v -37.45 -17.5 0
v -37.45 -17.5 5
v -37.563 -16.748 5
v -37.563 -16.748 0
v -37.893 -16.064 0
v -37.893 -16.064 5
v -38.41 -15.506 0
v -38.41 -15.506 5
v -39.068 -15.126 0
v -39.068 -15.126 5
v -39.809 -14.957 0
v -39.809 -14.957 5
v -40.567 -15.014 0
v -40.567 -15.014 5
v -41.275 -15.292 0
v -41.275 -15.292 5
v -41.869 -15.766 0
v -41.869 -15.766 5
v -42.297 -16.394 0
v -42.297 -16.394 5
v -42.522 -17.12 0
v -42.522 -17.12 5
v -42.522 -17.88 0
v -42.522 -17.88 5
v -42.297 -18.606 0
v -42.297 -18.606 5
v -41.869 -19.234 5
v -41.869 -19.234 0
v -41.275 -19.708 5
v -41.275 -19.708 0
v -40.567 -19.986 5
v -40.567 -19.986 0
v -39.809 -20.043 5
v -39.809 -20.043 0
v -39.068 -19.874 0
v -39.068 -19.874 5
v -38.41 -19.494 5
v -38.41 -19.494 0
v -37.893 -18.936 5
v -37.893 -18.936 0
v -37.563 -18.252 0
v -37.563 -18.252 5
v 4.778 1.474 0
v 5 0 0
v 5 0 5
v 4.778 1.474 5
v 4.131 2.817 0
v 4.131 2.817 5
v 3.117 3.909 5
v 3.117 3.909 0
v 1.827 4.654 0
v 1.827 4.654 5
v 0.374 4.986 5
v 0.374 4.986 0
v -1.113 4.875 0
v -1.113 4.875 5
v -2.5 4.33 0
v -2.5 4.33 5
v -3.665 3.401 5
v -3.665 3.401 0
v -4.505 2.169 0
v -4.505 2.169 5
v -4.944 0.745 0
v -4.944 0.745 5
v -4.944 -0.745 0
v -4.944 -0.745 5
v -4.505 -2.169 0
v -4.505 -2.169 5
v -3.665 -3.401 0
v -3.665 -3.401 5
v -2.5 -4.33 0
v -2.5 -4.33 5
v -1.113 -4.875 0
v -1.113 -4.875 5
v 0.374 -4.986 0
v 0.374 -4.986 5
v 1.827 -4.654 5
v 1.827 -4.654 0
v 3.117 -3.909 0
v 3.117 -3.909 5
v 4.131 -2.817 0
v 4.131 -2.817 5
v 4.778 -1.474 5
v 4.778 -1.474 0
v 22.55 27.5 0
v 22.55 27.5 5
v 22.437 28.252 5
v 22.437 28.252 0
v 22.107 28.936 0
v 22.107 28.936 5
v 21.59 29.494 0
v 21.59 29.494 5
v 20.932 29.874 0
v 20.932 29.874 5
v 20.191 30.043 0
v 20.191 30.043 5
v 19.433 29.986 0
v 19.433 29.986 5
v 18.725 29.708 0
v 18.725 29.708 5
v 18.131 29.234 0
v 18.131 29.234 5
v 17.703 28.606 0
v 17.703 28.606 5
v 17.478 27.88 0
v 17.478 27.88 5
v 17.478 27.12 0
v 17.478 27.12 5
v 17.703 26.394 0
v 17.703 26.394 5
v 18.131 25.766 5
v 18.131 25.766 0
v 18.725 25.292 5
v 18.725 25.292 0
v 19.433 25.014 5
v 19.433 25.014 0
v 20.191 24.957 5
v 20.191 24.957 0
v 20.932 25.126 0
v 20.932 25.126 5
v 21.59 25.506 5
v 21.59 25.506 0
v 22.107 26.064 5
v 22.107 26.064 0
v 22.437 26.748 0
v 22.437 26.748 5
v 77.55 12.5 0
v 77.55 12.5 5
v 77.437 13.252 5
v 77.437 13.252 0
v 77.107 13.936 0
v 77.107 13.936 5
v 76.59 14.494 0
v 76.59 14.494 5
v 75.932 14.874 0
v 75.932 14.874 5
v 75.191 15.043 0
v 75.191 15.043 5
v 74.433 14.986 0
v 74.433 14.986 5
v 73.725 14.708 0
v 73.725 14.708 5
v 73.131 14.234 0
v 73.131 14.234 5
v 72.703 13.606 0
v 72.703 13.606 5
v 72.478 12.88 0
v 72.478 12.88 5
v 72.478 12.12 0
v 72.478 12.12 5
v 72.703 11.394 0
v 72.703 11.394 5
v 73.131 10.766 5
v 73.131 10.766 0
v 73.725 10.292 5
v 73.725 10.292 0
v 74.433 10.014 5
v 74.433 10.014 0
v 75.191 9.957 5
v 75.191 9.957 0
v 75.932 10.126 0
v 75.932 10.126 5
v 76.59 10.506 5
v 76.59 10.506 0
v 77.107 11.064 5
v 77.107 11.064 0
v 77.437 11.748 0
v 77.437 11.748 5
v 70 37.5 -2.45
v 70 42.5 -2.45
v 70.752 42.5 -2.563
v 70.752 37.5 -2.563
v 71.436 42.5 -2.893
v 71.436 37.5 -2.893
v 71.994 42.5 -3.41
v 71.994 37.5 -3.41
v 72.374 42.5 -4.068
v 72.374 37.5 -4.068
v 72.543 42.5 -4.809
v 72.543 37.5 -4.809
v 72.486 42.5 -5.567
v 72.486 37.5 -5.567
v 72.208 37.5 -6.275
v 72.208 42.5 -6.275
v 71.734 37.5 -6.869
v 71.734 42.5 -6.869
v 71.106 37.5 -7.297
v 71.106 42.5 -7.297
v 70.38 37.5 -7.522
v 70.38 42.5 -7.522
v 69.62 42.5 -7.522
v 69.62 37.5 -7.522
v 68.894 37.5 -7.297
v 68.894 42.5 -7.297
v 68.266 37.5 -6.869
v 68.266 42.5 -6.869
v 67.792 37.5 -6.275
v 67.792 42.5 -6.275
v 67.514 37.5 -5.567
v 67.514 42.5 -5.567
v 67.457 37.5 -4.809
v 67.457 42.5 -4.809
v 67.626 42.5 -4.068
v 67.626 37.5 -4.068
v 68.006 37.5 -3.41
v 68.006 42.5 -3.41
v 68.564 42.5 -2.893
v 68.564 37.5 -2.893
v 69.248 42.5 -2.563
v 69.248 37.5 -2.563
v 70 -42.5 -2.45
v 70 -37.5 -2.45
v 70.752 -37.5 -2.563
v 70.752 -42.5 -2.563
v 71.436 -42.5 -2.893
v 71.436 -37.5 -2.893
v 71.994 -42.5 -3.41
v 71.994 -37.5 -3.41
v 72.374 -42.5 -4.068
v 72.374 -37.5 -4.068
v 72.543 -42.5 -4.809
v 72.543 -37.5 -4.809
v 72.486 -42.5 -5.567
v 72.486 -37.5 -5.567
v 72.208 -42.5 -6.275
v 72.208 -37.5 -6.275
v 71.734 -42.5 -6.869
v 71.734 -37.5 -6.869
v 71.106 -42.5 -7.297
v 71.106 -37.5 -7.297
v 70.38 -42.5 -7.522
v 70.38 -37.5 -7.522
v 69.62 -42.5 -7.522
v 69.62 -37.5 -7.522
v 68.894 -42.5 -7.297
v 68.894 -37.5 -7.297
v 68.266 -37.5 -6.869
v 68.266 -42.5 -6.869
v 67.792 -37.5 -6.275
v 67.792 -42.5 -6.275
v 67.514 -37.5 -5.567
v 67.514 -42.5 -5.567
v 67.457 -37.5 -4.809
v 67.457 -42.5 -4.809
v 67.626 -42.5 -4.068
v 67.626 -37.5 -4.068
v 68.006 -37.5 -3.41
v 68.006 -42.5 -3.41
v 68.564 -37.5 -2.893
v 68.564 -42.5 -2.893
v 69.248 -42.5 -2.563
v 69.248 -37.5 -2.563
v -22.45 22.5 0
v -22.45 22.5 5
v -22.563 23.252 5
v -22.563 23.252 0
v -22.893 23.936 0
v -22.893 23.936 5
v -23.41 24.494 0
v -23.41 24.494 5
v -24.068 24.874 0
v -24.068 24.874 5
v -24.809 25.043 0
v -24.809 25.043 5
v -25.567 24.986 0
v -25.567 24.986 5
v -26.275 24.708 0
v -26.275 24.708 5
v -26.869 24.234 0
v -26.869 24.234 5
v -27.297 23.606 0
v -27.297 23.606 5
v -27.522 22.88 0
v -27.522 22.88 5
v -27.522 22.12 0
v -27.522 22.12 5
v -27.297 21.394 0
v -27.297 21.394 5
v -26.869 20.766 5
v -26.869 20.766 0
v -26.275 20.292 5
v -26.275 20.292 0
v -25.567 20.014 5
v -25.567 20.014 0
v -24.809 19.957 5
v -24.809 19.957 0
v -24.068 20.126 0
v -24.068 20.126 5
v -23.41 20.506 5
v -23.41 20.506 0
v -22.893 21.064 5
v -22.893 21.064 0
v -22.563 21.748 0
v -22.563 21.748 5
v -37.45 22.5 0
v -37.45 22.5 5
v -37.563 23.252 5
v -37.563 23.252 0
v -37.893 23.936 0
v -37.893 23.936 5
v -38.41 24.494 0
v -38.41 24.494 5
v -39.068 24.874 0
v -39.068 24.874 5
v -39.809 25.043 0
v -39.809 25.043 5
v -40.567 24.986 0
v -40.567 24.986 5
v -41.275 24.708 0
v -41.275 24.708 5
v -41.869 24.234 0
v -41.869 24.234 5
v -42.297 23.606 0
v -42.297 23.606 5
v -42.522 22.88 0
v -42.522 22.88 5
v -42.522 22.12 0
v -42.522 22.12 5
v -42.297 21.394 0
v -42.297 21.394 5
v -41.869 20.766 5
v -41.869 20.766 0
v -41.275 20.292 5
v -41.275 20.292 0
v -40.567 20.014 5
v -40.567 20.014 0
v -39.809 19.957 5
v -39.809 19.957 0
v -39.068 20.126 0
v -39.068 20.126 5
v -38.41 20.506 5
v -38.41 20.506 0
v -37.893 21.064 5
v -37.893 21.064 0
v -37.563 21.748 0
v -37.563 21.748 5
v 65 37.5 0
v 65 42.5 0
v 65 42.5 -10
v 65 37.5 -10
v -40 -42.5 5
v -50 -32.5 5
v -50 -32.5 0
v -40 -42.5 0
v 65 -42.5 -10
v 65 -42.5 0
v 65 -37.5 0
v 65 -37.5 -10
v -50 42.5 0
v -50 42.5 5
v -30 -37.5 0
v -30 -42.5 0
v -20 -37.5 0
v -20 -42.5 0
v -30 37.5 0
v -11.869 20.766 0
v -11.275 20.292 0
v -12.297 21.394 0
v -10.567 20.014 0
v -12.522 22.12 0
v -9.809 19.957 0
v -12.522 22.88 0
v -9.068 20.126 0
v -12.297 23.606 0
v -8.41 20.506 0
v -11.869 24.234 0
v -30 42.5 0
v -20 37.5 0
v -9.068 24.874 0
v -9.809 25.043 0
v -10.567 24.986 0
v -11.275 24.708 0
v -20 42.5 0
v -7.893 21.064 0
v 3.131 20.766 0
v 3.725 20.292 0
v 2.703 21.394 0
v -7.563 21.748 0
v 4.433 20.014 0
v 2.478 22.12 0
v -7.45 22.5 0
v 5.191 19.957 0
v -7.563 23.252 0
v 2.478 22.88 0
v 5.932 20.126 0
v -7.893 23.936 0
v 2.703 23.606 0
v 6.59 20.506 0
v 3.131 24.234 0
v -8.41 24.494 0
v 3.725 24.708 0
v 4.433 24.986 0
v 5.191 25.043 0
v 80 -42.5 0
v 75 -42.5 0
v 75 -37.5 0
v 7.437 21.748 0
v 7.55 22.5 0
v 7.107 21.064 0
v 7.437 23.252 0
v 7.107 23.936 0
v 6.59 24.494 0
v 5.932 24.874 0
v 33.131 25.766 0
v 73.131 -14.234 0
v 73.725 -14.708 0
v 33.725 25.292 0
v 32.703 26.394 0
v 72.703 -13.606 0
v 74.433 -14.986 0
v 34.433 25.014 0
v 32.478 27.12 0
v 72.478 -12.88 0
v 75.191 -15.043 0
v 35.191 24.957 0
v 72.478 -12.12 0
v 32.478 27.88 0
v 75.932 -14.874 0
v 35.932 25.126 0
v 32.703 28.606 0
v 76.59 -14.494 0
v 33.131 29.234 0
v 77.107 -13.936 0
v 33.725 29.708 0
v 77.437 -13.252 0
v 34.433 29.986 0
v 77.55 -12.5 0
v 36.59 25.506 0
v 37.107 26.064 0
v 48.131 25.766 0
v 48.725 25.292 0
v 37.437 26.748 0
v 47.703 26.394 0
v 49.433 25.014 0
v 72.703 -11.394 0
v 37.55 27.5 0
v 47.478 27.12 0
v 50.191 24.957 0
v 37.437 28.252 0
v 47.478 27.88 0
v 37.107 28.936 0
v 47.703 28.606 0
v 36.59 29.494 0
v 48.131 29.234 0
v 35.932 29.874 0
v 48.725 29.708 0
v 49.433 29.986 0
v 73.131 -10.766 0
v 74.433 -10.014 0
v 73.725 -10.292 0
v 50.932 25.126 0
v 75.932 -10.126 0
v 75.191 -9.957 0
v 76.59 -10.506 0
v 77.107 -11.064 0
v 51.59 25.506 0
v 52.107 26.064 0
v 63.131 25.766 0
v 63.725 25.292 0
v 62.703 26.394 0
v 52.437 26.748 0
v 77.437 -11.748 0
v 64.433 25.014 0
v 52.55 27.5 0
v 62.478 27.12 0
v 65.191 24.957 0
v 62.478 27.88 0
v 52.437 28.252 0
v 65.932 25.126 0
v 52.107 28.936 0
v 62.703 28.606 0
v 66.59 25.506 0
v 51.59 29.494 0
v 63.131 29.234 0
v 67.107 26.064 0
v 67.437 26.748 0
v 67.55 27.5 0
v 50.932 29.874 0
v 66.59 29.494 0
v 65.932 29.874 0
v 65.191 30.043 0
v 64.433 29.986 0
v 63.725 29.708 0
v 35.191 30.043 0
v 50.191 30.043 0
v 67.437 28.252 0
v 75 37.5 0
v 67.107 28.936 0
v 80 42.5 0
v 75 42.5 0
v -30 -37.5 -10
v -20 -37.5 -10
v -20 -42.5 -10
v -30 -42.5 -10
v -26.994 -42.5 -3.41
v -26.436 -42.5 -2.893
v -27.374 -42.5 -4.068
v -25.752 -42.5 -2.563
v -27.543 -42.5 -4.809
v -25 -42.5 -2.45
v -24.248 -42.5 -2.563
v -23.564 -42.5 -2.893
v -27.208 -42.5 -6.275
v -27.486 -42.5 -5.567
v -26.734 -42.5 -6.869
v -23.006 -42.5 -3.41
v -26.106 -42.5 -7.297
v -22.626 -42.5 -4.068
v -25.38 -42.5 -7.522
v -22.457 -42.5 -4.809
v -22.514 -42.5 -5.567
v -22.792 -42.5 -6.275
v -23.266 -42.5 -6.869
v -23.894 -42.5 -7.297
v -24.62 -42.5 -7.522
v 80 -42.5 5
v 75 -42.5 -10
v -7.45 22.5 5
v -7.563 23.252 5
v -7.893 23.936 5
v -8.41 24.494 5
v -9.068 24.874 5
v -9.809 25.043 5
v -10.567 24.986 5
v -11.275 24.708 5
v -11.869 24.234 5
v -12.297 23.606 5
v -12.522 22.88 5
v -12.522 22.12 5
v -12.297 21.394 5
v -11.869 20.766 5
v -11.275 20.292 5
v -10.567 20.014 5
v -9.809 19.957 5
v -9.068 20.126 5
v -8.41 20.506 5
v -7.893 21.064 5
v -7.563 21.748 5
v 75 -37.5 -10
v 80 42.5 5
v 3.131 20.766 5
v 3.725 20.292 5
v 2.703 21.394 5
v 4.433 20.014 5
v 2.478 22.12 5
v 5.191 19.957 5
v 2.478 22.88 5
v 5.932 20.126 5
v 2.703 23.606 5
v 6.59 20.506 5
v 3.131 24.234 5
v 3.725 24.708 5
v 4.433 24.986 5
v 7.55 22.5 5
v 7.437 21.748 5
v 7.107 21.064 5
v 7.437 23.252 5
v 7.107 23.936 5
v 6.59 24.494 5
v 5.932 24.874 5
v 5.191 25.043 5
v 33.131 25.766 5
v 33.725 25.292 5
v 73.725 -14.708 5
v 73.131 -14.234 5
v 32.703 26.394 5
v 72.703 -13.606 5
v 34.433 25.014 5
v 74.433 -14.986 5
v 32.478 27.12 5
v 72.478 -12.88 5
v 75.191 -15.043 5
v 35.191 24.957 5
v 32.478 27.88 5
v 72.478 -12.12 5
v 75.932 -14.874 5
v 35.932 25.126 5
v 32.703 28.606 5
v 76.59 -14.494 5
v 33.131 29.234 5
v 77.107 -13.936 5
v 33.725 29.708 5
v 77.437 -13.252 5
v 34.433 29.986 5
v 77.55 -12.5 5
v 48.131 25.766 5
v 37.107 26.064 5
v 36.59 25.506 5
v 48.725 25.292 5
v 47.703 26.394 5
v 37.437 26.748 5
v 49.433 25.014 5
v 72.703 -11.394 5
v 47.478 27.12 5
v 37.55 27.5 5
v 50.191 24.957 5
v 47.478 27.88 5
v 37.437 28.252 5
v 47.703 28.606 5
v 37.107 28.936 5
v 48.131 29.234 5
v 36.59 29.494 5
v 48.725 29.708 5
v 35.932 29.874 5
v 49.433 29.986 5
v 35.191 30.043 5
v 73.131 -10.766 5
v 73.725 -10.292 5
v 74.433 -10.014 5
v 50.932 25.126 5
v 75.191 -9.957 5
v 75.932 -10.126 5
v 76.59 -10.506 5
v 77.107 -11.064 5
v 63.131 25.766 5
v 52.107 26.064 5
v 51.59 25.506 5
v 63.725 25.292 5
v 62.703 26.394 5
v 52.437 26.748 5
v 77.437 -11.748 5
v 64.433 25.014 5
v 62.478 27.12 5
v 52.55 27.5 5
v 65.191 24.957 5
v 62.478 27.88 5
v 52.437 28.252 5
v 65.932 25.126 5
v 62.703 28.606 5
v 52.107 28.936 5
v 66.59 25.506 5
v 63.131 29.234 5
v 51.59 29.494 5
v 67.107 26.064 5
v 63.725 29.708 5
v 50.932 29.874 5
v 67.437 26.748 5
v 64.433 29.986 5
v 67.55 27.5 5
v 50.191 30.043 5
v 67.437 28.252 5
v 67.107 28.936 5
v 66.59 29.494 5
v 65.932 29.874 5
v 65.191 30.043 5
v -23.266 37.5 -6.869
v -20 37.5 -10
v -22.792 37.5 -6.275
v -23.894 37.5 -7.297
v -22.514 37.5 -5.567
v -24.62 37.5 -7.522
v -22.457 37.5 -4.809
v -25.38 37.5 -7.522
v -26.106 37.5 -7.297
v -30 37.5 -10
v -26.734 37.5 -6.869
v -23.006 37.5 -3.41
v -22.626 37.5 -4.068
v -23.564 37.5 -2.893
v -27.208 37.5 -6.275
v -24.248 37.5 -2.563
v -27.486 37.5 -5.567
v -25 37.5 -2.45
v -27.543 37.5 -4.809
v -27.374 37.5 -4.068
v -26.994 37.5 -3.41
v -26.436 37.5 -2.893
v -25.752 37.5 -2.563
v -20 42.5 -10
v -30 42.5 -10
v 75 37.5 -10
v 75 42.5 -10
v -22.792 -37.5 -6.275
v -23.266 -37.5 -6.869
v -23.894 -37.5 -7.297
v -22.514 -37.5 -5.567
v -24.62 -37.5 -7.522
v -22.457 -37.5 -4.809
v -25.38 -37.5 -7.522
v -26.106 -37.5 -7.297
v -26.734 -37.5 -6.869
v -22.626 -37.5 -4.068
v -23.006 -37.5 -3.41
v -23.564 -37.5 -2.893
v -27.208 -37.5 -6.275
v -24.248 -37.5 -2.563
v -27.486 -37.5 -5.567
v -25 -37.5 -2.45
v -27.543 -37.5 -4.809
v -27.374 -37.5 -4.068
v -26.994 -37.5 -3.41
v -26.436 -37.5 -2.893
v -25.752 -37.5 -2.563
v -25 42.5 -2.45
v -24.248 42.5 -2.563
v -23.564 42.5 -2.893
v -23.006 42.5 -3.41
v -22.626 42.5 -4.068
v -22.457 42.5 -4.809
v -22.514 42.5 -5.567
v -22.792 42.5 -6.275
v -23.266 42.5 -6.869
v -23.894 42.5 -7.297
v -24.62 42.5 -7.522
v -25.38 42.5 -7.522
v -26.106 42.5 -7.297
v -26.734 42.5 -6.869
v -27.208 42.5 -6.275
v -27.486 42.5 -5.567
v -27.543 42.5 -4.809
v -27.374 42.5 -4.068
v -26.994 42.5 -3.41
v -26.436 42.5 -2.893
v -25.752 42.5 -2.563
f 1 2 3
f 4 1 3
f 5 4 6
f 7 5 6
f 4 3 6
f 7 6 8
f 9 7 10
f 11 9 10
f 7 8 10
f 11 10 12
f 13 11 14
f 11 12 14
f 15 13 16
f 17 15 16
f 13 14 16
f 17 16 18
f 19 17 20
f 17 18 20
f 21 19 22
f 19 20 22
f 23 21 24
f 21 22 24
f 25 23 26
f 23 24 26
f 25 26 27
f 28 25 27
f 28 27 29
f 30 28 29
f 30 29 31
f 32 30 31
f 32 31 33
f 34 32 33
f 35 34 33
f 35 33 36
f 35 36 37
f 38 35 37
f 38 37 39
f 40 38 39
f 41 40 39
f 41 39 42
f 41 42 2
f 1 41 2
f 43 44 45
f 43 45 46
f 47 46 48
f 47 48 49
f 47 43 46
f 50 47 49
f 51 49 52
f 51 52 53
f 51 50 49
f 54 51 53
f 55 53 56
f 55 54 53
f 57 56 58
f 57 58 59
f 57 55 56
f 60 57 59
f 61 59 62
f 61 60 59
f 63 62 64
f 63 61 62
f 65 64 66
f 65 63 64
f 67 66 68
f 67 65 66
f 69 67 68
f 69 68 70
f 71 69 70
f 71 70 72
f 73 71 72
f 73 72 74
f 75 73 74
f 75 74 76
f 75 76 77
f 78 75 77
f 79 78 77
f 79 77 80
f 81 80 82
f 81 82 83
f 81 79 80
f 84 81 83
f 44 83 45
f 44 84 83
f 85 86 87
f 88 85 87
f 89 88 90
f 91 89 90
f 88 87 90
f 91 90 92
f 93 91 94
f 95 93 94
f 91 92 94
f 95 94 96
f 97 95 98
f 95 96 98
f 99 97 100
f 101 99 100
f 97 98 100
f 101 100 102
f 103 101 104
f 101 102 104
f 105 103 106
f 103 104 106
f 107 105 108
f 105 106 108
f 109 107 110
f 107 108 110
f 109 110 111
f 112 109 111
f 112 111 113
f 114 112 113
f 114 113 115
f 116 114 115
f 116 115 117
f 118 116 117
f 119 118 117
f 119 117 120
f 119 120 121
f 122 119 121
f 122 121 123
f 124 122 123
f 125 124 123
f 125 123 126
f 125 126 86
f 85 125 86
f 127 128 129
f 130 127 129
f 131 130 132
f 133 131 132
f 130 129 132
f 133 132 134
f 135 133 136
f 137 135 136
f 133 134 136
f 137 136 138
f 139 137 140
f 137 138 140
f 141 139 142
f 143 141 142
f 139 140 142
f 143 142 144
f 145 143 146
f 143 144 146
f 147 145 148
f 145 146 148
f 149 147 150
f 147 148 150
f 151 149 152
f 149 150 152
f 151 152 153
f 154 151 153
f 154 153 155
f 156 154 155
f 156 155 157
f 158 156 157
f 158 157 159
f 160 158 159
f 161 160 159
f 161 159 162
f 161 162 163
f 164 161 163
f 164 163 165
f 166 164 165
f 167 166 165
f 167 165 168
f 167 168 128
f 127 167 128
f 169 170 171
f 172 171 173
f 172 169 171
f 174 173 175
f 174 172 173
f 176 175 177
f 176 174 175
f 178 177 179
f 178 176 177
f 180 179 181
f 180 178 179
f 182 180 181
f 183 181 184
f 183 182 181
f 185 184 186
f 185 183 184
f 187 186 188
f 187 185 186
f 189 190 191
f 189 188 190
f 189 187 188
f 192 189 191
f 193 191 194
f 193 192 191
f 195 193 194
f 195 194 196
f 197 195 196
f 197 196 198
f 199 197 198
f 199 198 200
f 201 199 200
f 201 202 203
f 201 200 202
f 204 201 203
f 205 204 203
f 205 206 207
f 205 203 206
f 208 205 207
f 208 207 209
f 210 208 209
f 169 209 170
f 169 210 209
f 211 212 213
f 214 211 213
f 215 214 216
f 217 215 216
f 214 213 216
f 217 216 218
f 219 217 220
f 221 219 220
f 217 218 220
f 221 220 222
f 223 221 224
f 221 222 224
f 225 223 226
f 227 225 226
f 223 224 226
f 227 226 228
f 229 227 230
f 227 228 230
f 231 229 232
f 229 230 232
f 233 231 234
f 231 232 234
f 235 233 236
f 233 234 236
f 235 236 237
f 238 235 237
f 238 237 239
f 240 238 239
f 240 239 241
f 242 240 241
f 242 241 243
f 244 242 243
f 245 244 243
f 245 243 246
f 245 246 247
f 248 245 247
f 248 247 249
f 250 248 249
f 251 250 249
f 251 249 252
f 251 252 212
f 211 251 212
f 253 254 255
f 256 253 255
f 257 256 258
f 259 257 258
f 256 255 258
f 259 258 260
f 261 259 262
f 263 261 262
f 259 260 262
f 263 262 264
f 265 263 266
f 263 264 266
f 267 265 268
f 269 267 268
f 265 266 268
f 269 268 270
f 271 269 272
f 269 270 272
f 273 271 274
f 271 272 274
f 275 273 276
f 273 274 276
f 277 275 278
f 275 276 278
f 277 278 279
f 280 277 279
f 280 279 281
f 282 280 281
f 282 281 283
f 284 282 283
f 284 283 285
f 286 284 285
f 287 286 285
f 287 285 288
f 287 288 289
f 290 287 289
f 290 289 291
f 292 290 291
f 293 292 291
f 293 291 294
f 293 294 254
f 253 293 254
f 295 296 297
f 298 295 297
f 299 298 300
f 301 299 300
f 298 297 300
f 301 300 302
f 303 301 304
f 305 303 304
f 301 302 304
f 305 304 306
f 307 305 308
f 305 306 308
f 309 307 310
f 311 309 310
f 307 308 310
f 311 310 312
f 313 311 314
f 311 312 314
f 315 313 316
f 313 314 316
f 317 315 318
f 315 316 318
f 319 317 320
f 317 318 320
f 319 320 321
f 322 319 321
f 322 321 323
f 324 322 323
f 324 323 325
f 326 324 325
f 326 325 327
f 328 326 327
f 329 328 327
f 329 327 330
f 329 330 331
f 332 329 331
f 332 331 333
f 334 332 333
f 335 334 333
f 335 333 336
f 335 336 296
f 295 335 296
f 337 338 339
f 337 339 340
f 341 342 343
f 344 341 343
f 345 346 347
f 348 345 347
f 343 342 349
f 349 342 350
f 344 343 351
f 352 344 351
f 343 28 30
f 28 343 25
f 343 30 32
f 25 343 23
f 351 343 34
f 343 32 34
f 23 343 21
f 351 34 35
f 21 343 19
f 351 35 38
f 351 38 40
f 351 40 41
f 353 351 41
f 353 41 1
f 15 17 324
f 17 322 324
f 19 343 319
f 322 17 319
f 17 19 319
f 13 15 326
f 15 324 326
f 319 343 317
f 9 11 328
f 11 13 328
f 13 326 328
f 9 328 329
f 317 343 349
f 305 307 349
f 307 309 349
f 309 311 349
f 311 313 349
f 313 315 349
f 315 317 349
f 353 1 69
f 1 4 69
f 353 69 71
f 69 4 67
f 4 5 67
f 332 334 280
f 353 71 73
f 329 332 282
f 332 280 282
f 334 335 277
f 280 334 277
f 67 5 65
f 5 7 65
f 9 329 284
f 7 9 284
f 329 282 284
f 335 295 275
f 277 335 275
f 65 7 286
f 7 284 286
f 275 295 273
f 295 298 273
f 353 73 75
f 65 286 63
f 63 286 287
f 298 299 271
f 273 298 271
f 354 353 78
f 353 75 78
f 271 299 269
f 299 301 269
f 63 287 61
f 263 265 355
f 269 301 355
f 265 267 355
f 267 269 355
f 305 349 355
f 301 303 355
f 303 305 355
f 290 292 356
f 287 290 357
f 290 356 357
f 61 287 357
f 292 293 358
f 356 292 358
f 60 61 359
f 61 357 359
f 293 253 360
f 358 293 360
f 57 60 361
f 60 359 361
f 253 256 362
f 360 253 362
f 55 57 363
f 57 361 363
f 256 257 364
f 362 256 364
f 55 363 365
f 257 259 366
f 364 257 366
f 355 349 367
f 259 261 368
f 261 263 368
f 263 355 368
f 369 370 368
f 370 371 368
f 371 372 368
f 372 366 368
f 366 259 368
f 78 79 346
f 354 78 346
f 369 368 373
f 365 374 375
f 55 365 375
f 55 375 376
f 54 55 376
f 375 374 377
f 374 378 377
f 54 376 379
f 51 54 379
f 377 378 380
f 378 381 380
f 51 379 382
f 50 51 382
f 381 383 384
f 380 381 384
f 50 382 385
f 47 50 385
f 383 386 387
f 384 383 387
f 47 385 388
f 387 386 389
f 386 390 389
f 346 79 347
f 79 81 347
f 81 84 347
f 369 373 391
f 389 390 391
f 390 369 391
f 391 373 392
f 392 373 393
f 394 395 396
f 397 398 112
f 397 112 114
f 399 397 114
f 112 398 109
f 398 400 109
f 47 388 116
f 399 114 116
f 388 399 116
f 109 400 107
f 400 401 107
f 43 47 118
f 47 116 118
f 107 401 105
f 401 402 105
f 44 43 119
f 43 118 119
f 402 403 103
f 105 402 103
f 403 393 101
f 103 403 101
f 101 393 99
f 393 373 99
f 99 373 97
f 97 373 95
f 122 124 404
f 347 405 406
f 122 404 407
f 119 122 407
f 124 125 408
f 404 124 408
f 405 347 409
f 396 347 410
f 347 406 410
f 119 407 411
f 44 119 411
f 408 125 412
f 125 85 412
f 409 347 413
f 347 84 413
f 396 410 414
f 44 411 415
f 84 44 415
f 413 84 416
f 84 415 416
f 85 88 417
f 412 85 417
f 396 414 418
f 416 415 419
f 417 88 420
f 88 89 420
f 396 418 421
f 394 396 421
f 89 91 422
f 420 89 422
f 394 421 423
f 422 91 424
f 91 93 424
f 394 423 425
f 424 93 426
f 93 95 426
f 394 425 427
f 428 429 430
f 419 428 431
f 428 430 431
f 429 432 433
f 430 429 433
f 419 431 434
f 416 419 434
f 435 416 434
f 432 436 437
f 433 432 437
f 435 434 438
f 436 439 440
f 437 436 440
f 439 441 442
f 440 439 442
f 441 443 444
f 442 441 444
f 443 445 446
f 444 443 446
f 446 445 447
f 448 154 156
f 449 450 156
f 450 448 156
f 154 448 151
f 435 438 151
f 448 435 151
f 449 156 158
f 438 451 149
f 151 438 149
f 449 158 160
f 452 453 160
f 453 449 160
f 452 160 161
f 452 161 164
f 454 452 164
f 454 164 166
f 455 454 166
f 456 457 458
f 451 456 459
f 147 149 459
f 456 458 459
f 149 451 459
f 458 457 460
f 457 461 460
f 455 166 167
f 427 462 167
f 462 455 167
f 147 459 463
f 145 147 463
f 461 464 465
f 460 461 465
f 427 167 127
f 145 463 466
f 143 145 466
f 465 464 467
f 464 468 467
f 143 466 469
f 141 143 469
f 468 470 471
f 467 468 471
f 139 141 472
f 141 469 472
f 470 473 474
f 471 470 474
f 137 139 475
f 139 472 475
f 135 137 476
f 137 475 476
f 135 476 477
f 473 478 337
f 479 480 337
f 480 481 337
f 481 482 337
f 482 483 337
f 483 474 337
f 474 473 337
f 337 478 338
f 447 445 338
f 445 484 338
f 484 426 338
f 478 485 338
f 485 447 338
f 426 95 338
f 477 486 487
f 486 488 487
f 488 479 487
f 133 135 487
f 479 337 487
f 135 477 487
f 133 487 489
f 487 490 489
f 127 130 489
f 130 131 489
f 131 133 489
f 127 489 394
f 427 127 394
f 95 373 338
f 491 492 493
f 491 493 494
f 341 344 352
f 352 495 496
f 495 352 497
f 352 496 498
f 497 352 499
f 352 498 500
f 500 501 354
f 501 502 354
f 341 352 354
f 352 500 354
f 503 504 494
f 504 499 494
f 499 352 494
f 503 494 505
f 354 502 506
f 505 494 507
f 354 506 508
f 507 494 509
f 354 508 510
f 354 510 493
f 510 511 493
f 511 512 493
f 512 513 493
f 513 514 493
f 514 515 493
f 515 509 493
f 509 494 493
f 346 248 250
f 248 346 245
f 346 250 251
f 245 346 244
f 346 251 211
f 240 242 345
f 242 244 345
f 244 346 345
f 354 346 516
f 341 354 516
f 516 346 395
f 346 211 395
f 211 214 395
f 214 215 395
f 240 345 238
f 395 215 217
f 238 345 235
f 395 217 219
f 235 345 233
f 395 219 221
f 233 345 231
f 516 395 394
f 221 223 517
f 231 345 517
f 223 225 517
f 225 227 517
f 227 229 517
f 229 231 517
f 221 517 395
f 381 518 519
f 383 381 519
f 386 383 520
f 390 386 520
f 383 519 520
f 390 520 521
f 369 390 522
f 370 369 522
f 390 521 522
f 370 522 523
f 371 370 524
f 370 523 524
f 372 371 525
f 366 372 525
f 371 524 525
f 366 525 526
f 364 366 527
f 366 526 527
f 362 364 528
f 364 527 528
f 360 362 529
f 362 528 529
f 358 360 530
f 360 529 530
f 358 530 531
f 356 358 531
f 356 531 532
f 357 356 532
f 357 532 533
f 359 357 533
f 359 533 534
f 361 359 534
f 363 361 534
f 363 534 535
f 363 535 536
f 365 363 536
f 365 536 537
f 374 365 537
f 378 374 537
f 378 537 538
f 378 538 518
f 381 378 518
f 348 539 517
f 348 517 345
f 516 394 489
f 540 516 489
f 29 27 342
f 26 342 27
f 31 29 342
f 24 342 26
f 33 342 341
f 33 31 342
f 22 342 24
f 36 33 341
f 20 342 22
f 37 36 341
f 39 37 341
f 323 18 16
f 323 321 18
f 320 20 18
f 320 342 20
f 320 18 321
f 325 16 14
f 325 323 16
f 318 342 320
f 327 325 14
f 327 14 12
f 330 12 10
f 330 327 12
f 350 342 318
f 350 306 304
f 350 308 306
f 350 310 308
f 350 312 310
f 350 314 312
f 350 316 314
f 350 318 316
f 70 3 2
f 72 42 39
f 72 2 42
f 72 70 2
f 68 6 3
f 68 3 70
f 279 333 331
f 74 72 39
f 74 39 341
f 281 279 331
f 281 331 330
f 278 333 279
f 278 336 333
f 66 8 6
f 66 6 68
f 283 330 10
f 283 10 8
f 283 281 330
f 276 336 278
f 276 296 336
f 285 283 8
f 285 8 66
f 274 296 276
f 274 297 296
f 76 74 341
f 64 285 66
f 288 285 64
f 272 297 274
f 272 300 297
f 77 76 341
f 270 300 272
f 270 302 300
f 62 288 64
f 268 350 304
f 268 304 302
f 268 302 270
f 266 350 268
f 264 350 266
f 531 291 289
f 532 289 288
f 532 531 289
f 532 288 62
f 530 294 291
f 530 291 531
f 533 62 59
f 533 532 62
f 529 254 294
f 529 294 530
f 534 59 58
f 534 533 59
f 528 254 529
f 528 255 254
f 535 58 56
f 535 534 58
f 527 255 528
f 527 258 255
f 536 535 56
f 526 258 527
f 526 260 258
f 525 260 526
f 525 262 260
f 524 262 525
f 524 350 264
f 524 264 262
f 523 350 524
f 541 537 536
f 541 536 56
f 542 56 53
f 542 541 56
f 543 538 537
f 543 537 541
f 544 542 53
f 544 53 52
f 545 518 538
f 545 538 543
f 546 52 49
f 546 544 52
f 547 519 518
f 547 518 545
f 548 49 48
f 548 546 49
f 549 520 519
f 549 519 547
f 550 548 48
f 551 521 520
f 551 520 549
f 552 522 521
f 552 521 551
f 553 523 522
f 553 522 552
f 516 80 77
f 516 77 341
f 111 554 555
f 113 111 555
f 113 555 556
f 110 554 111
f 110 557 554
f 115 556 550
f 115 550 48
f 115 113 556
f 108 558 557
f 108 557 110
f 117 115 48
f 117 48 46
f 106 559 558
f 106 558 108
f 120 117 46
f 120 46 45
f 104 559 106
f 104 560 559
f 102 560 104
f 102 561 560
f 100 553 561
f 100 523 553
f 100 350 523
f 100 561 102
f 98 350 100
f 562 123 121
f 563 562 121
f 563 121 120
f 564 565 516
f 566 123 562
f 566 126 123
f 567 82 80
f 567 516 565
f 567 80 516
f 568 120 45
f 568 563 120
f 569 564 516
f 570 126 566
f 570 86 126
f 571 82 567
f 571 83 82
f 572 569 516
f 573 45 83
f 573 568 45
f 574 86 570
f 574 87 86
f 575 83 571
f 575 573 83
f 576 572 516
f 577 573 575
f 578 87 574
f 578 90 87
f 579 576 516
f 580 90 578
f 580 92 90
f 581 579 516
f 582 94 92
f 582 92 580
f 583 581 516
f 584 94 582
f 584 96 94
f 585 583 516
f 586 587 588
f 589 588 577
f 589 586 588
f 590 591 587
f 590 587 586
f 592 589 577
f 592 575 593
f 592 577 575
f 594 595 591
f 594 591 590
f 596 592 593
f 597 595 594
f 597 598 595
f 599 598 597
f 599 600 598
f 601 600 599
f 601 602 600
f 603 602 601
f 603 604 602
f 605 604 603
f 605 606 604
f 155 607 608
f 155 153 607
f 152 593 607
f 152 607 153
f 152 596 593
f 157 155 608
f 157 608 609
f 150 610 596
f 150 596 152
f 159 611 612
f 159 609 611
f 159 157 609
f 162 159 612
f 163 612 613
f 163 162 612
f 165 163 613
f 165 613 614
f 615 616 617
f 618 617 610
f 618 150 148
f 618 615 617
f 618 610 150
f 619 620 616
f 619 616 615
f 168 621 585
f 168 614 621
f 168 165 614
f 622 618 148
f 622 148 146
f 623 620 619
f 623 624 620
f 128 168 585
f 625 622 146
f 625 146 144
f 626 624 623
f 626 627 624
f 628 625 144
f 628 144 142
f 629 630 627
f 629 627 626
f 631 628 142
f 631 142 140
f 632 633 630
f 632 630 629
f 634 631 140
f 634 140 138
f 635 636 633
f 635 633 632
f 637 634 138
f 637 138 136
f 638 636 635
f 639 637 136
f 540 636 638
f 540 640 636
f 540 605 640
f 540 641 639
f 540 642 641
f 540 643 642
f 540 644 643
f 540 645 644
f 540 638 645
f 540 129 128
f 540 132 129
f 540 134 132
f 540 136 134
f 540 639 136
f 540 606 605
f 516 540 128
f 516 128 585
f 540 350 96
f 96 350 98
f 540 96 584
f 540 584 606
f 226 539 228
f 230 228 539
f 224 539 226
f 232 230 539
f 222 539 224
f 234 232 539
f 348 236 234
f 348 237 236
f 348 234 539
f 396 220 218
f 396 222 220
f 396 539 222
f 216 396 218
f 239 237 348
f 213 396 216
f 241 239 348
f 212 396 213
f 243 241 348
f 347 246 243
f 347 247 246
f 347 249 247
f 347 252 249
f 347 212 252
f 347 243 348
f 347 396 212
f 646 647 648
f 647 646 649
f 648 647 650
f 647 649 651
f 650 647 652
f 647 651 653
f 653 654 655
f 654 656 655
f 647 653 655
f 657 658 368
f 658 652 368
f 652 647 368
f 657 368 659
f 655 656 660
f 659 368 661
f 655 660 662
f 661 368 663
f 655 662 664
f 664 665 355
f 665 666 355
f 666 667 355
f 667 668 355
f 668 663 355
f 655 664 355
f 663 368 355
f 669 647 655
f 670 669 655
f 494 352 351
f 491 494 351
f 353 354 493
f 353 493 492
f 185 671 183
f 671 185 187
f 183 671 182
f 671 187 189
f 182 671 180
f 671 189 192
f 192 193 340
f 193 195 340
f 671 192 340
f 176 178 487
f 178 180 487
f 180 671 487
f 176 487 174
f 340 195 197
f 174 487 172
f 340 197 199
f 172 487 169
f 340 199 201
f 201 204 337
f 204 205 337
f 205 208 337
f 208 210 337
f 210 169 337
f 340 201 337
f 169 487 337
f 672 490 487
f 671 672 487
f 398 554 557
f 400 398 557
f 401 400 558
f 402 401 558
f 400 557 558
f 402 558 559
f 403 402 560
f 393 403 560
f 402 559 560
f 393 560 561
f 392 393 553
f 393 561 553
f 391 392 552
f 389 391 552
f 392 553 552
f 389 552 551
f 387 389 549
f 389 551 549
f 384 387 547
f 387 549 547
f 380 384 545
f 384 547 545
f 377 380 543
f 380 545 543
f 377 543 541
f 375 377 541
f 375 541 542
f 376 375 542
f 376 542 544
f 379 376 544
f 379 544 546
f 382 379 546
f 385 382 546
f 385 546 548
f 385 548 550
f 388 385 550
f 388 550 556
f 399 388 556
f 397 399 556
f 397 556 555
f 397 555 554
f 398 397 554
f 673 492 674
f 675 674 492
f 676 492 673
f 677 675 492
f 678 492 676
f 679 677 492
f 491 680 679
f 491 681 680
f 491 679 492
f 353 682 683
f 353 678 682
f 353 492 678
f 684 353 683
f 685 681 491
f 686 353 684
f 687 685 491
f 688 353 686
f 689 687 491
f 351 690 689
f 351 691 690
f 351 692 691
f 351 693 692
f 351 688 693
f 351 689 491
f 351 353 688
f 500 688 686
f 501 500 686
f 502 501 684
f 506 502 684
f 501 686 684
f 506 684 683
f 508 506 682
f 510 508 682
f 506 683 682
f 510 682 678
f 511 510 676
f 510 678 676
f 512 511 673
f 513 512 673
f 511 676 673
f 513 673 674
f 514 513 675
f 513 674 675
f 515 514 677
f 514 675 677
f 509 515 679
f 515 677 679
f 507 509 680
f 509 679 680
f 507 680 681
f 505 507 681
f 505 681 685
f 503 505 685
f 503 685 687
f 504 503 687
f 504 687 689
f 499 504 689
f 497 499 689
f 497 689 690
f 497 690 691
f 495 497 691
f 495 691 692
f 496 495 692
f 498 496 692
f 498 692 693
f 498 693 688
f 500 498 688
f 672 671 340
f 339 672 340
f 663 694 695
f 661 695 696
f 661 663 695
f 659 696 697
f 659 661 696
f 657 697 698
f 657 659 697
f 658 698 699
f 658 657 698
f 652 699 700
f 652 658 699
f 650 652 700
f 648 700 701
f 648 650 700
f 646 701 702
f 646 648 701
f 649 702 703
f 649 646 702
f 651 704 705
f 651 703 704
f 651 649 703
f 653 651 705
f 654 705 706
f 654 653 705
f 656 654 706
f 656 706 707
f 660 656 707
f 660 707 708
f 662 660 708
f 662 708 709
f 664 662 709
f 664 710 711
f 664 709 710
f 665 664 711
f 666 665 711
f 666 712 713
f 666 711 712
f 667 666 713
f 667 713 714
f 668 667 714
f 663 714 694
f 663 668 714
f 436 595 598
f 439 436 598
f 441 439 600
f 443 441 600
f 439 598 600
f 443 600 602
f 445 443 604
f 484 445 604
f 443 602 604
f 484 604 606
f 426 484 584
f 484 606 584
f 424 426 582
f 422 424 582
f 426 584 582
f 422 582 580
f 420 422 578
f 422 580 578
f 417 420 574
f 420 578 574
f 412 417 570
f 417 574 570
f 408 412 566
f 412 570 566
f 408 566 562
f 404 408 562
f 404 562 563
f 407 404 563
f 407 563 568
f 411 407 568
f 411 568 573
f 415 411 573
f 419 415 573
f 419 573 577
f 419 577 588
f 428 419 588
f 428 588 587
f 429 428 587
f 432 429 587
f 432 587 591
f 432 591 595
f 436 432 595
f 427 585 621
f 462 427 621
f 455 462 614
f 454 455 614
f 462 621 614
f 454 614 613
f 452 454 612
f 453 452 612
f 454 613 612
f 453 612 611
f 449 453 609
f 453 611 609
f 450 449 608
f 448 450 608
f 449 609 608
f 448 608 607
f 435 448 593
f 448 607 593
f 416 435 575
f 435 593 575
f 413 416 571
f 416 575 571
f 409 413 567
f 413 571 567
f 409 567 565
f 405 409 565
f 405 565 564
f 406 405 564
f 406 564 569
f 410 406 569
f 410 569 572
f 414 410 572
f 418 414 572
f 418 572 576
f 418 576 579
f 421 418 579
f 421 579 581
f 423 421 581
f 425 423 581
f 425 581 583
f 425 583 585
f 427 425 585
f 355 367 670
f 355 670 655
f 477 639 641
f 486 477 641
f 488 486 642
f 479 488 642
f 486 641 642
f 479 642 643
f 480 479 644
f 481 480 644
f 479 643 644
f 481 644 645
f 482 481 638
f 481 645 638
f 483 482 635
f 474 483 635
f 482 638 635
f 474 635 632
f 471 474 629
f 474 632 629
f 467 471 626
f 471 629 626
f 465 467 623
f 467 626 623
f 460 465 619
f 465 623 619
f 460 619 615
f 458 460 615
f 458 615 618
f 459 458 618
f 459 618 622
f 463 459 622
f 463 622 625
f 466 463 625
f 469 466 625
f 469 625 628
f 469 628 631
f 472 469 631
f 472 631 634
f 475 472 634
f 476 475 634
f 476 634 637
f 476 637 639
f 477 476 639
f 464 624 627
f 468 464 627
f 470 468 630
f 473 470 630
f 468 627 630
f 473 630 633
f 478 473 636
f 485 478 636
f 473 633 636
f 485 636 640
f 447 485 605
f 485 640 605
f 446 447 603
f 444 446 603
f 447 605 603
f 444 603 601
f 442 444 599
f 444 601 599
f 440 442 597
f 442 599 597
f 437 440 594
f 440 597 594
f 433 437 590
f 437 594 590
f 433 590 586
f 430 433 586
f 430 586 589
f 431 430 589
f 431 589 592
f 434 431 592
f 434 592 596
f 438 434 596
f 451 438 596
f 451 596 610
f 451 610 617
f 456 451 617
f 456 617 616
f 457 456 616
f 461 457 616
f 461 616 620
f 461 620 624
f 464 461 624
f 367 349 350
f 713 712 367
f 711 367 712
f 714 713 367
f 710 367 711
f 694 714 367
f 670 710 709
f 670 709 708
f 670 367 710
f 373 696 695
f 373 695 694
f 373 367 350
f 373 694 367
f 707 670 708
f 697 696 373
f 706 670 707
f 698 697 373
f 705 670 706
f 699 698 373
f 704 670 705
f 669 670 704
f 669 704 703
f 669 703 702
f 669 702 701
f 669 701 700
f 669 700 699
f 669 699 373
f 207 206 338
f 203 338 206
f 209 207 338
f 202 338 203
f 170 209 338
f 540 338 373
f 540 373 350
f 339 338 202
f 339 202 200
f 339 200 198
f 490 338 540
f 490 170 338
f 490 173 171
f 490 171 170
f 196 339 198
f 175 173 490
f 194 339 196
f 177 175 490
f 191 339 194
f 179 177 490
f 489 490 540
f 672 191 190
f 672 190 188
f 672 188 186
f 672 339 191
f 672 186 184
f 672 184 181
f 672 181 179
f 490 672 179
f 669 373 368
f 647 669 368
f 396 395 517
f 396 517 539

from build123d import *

# Parameters (mm, degrees)
SKETCH1_W           = 160
SKETCH1_H           = 85
SKETCH1_R           = 5
BOSS_EXTRUDE1_DEPTH = 5
SKETCH3_W           = 30
SKETCH3_H           = 85
CUT_EXTRUDE2_DEPTH  = 15
SKETCH5_R           = 2.55
CUT_EXTRUDE3_DEPTH  = 15
CHAMFER1_SIZE       = 10
SKETCH6_W           = 10
SKETCH6_H           = 5
BOSS_EXTRUDE2_DEPTH = 10
SKETCH7_R           = 2.55
CUT_EXTRUDE4_DEPTH  = 114.578166916
SKETCH8_R           = 2.55
CUT_EXTRUDE5_DEPTH  = 92.821838361


with BuildPart() as part:
    # Sketch1 → Boss-Extrude1 (new body)
    with BuildSketch(Plane.XY):
        Rectangle(SKETCH1_W, SKETCH1_H)
        Circle(SKETCH1_R, mode=Mode.SUBTRACT)
    extrude(amount=BOSS_EXTRUDE1_DEPTH)

    # Sketch3 → Cut-Extrude2 (cut)
    with BuildSketch(Plane.XY.offset(5)):
        with Locations((-65, 0)):
            Rectangle(SKETCH3_W, SKETCH3_H)
    extrude(amount=-CUT_EXTRUDE2_DEPTH, mode=Mode.SUBTRACT)

    # Sketch5 → Cut-Extrude3 (cut)
    with BuildSketch(Plane.XY.offset(5)):
        with Locations((65, 27.5)):
            Circle(SKETCH5_R)
        with Locations((50, 27.5)):
            Circle(SKETCH5_R)
        with Locations((35, 27.5)):
            Circle(SKETCH5_R)
        with Locations((20, 27.5)):
            Circle(SKETCH5_R)
        with Locations((5, 22.5)):
            Circle(SKETCH5_R)
        with Locations((-10, 22.5)):
            Circle(SKETCH5_R)
        with Locations((-25, 22.5)):
            Circle(SKETCH5_R)
        with Locations((-40, 22.5)):
            Circle(SKETCH5_R)
        with Locations((-40, -17.5)):
            Circle(SKETCH5_R)
    extrude(amount=-CUT_EXTRUDE3_DEPTH, mode=Mode.SUBTRACT)

    # Chamfer1
    chamfer1_edges = [part.edges().sort_by_distance(p)[0] for p in [
        (-50, -42.5, 2.5),
    ]]
    chamfer(chamfer1_edges, length=CHAMFER1_SIZE)

    # Sketch6 → Boss-Extrude2 (add)
    with BuildSketch(Plane(origin=(0, 0, 0), x_dir=(-1, 0, 0), z_dir=(0, 0, -1))):
        with Locations((-70, -40)):
            Rectangle(SKETCH6_W, SKETCH6_H)
        with Locations((25, -40)):
            Rectangle(SKETCH6_W, SKETCH6_H)
    boss_extrude2 = extrude(amount=BOSS_EXTRUDE2_DEPTH)

    # Sketch7 → Cut-Extrude4 (cut, through all)
    with BuildSketch(Plane(origin=(0, -37.5, 0), x_dir=(1, 0, 0), z_dir=(0, 1, 0))):
        with Locations(Location((70, 5, 0), (0, 0, 270))):
            Circle(SKETCH7_R)
        with Locations(Location((-25, 5, 0), (0, 0, 270))):
            Circle(SKETCH7_R)
    cut_extrude4 = extrude(amount=-CUT_EXTRUDE4_DEPTH, mode=Mode.SUBTRACT)

    # Mirror1: Boss-Extrude2 across plane
    add(boss_extrude2.mirror(Plane.ZX))

    # Mirror2: Cut-Extrude4 across plane
    add(cut_extrude4.mirror(Plane.ZX), mode=Mode.SUBTRACT)

    # Sketch8 → Cut-Extrude5 (cut, through all)
    with BuildSketch(Plane.XY.offset(5)):
        with Locations((75, 12.5)):
            Circle(SKETCH8_R)
        with Locations((75, -12.5)):
            Circle(SKETCH8_R)
    extrude(amount=-CUT_EXTRUDE5_DEPTH, mode=Mode.SUBTRACT)


solid = part.part
